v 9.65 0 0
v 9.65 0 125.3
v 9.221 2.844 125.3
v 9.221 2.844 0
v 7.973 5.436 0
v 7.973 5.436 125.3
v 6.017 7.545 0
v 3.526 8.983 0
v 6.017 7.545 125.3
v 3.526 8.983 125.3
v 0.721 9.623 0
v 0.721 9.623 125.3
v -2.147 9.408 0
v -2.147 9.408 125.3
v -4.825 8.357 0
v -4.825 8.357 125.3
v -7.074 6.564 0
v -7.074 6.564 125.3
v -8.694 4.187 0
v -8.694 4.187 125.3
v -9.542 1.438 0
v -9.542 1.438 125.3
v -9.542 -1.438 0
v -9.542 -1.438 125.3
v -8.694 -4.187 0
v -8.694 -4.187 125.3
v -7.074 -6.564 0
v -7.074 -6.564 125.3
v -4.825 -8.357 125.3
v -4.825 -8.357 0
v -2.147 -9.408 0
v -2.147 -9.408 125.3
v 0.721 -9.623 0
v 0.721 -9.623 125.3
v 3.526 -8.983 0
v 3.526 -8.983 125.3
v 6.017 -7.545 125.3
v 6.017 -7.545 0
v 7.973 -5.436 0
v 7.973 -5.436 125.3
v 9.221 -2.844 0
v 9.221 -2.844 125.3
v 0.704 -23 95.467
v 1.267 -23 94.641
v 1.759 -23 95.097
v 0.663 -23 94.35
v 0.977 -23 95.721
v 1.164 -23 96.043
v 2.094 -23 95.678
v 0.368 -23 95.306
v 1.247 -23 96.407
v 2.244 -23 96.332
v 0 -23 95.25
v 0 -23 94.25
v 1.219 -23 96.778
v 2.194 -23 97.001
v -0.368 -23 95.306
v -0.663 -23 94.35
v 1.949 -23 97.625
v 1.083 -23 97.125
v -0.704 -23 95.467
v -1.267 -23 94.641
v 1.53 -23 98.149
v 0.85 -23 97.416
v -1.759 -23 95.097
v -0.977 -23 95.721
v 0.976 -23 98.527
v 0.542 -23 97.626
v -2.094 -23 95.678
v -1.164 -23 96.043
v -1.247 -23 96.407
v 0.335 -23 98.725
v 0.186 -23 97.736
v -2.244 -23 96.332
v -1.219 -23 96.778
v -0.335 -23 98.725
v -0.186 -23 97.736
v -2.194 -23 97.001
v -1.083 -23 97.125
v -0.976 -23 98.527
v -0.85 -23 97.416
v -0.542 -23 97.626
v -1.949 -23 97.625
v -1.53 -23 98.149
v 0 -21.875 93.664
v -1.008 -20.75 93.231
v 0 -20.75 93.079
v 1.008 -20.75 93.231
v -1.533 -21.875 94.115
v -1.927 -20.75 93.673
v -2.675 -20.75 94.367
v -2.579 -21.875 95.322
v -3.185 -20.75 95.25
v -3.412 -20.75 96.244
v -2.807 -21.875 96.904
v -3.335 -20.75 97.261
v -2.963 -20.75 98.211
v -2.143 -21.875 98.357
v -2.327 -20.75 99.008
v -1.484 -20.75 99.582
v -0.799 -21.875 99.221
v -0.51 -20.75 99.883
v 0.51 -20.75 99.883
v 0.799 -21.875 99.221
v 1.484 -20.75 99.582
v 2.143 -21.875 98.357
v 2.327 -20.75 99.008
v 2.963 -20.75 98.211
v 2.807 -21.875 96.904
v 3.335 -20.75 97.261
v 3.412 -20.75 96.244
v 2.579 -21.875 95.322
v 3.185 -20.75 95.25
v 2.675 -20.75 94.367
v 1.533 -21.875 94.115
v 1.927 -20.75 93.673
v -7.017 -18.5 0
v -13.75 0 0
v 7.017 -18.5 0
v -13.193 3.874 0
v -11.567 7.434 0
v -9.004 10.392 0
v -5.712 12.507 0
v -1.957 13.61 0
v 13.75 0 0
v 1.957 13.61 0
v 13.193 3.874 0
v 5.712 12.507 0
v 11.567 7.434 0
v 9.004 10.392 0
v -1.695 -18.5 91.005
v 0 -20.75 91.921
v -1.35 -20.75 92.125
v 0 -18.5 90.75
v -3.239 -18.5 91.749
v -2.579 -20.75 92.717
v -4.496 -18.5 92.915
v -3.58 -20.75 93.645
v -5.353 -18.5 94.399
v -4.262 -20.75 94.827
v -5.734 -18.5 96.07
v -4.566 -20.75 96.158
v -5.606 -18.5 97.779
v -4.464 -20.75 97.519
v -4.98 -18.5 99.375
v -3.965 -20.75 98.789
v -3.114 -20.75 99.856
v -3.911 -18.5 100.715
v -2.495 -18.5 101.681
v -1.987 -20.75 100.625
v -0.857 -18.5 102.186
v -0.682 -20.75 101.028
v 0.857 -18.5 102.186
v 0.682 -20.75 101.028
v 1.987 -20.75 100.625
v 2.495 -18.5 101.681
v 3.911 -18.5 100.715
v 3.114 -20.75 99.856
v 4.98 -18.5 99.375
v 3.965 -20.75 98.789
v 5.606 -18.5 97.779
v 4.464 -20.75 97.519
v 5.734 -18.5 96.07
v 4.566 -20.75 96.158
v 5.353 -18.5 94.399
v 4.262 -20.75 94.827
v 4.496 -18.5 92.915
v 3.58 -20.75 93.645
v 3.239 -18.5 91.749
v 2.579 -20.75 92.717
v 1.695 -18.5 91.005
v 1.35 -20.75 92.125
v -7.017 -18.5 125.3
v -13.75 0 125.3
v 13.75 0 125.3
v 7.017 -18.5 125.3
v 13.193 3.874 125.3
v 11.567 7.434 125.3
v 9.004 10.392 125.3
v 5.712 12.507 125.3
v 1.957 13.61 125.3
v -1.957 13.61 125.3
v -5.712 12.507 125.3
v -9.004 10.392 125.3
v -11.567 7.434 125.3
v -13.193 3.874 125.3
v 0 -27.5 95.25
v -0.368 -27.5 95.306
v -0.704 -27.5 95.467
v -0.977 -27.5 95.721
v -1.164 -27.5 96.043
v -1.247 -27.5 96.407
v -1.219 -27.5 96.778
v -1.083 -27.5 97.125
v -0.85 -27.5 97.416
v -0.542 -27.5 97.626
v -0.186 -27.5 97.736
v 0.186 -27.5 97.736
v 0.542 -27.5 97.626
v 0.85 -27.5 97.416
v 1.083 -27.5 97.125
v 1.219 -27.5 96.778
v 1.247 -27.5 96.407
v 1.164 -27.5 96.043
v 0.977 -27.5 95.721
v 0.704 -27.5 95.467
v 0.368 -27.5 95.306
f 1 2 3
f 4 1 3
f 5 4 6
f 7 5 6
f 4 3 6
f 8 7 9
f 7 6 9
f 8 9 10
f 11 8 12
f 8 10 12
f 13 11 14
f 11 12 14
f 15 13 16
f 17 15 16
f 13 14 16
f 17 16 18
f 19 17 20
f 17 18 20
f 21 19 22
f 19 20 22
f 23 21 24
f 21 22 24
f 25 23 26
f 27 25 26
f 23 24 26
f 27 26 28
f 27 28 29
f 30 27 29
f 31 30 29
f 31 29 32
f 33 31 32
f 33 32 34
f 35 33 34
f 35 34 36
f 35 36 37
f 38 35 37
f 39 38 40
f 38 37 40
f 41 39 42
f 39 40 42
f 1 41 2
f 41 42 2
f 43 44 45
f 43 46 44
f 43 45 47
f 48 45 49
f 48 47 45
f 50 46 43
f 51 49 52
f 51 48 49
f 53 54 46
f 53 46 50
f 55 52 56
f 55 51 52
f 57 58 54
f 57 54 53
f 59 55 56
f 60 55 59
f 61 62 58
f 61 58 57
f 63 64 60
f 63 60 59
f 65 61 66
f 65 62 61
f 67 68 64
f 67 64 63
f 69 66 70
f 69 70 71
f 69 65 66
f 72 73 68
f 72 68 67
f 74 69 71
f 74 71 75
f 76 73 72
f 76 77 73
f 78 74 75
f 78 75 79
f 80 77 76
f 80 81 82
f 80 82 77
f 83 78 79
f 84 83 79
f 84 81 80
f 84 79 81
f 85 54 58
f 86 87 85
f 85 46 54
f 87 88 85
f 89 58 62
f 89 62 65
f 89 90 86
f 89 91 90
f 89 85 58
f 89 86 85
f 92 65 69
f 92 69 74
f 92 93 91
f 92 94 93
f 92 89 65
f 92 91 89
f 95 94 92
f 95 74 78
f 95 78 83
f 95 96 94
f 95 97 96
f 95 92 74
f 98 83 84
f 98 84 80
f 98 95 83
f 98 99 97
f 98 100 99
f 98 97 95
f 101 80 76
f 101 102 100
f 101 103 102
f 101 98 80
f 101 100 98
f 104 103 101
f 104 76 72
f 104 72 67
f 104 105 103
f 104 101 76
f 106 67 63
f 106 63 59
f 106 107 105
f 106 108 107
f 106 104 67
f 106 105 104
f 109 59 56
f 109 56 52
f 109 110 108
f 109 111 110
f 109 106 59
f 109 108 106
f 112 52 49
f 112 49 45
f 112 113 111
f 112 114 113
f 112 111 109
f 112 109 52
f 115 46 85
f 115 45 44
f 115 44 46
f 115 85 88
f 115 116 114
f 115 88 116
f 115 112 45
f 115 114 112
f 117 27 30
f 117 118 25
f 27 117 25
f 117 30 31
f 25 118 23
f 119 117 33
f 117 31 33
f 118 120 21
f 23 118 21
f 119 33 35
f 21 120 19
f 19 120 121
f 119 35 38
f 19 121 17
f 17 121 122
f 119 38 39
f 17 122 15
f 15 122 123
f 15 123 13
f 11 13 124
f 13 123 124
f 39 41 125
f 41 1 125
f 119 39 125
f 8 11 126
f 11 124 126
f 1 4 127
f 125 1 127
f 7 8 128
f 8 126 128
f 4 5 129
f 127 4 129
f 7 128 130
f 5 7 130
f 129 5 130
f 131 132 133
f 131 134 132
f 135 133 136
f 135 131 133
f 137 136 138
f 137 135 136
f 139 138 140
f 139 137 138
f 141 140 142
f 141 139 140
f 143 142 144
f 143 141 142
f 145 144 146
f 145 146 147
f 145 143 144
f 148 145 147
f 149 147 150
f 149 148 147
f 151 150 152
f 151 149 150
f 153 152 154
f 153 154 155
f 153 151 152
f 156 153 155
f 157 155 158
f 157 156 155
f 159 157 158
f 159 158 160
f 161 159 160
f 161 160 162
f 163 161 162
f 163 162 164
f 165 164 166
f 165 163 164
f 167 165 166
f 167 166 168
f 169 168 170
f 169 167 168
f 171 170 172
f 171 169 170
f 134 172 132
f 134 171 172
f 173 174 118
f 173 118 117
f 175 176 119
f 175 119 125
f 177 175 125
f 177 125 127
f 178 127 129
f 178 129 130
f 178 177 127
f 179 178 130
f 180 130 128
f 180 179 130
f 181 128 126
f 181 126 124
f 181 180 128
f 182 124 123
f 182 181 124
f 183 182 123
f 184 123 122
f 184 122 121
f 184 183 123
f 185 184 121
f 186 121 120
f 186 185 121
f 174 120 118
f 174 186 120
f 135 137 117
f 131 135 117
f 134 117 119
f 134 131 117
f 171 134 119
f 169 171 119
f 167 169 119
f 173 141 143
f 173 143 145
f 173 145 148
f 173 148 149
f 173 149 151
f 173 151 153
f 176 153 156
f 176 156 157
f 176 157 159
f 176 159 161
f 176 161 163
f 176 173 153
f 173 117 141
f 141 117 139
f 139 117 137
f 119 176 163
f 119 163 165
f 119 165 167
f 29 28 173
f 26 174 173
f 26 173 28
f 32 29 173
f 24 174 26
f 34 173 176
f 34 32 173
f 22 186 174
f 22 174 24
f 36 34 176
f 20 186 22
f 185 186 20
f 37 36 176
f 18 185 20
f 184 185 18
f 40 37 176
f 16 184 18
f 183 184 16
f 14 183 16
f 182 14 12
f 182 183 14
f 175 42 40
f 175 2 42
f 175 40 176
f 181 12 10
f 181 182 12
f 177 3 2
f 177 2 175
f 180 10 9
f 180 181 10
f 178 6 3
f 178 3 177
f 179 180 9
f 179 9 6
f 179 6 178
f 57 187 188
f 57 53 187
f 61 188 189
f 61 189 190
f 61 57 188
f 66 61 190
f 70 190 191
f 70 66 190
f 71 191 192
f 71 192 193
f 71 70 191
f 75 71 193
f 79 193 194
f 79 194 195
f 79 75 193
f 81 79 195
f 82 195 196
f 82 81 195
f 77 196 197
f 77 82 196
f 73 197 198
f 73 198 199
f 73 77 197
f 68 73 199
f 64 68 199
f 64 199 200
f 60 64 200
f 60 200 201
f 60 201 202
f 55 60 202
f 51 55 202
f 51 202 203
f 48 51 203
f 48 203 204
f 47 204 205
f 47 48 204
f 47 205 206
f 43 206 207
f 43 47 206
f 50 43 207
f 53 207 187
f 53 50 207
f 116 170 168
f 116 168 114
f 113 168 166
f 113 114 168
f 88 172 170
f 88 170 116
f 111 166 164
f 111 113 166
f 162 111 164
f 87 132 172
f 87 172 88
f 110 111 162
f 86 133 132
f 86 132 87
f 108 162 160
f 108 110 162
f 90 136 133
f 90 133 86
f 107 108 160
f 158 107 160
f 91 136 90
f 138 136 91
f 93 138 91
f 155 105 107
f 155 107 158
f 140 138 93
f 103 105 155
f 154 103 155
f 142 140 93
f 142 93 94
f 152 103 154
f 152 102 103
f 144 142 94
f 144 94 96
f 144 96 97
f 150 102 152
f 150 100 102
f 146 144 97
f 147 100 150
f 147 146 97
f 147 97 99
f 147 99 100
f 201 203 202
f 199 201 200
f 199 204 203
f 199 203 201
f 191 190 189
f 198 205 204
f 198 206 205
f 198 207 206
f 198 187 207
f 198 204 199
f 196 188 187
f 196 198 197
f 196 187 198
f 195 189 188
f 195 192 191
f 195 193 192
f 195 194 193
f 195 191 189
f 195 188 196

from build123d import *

# Parameters (mm, degrees)
SKETCH1_R  = 9.65
BODY_DEPTH = 125.3


with BuildPart() as part:
    # Sketch1 → Body (new body)
    with BuildSketch(Plane.XY.offset(125.3)):
        with BuildLine():
            Line((-7.016550666, -18.5), (7.016550666, -18.5))
            Line((7.016550666, -18.5), (13.75, 0))
            ThreePointArc((13.75, 0), (0, 13.75), (-13.75, 0))
            Line((-13.75, 0), (-7.016550666, -18.5))
        make_face()
        Circle(SKETCH1_R, mode=Mode.SUBTRACT)
    extrude(amount=-BODY_DEPTH)

    # Sketch2 → Electric-Output (revolve)
    with BuildSketch(Plane(origin=(0, 0, 0), x_dir=(0, 0, -1), z_dir=(1, 0, 0))):
        Polygon((-91.921275864, -20.75), (-90.75, -18.5), (-96.5, -18.5), (-96.5, -23), (-96.5, -27.5), (-95.25, -27.5), (-95.25, -23), (-94.25, -23), (-93.078724136, -20.75), align=None)
    revolve(axis=Axis((0, -23, 96.5), (0, 1, 0)))


solid = part.part
